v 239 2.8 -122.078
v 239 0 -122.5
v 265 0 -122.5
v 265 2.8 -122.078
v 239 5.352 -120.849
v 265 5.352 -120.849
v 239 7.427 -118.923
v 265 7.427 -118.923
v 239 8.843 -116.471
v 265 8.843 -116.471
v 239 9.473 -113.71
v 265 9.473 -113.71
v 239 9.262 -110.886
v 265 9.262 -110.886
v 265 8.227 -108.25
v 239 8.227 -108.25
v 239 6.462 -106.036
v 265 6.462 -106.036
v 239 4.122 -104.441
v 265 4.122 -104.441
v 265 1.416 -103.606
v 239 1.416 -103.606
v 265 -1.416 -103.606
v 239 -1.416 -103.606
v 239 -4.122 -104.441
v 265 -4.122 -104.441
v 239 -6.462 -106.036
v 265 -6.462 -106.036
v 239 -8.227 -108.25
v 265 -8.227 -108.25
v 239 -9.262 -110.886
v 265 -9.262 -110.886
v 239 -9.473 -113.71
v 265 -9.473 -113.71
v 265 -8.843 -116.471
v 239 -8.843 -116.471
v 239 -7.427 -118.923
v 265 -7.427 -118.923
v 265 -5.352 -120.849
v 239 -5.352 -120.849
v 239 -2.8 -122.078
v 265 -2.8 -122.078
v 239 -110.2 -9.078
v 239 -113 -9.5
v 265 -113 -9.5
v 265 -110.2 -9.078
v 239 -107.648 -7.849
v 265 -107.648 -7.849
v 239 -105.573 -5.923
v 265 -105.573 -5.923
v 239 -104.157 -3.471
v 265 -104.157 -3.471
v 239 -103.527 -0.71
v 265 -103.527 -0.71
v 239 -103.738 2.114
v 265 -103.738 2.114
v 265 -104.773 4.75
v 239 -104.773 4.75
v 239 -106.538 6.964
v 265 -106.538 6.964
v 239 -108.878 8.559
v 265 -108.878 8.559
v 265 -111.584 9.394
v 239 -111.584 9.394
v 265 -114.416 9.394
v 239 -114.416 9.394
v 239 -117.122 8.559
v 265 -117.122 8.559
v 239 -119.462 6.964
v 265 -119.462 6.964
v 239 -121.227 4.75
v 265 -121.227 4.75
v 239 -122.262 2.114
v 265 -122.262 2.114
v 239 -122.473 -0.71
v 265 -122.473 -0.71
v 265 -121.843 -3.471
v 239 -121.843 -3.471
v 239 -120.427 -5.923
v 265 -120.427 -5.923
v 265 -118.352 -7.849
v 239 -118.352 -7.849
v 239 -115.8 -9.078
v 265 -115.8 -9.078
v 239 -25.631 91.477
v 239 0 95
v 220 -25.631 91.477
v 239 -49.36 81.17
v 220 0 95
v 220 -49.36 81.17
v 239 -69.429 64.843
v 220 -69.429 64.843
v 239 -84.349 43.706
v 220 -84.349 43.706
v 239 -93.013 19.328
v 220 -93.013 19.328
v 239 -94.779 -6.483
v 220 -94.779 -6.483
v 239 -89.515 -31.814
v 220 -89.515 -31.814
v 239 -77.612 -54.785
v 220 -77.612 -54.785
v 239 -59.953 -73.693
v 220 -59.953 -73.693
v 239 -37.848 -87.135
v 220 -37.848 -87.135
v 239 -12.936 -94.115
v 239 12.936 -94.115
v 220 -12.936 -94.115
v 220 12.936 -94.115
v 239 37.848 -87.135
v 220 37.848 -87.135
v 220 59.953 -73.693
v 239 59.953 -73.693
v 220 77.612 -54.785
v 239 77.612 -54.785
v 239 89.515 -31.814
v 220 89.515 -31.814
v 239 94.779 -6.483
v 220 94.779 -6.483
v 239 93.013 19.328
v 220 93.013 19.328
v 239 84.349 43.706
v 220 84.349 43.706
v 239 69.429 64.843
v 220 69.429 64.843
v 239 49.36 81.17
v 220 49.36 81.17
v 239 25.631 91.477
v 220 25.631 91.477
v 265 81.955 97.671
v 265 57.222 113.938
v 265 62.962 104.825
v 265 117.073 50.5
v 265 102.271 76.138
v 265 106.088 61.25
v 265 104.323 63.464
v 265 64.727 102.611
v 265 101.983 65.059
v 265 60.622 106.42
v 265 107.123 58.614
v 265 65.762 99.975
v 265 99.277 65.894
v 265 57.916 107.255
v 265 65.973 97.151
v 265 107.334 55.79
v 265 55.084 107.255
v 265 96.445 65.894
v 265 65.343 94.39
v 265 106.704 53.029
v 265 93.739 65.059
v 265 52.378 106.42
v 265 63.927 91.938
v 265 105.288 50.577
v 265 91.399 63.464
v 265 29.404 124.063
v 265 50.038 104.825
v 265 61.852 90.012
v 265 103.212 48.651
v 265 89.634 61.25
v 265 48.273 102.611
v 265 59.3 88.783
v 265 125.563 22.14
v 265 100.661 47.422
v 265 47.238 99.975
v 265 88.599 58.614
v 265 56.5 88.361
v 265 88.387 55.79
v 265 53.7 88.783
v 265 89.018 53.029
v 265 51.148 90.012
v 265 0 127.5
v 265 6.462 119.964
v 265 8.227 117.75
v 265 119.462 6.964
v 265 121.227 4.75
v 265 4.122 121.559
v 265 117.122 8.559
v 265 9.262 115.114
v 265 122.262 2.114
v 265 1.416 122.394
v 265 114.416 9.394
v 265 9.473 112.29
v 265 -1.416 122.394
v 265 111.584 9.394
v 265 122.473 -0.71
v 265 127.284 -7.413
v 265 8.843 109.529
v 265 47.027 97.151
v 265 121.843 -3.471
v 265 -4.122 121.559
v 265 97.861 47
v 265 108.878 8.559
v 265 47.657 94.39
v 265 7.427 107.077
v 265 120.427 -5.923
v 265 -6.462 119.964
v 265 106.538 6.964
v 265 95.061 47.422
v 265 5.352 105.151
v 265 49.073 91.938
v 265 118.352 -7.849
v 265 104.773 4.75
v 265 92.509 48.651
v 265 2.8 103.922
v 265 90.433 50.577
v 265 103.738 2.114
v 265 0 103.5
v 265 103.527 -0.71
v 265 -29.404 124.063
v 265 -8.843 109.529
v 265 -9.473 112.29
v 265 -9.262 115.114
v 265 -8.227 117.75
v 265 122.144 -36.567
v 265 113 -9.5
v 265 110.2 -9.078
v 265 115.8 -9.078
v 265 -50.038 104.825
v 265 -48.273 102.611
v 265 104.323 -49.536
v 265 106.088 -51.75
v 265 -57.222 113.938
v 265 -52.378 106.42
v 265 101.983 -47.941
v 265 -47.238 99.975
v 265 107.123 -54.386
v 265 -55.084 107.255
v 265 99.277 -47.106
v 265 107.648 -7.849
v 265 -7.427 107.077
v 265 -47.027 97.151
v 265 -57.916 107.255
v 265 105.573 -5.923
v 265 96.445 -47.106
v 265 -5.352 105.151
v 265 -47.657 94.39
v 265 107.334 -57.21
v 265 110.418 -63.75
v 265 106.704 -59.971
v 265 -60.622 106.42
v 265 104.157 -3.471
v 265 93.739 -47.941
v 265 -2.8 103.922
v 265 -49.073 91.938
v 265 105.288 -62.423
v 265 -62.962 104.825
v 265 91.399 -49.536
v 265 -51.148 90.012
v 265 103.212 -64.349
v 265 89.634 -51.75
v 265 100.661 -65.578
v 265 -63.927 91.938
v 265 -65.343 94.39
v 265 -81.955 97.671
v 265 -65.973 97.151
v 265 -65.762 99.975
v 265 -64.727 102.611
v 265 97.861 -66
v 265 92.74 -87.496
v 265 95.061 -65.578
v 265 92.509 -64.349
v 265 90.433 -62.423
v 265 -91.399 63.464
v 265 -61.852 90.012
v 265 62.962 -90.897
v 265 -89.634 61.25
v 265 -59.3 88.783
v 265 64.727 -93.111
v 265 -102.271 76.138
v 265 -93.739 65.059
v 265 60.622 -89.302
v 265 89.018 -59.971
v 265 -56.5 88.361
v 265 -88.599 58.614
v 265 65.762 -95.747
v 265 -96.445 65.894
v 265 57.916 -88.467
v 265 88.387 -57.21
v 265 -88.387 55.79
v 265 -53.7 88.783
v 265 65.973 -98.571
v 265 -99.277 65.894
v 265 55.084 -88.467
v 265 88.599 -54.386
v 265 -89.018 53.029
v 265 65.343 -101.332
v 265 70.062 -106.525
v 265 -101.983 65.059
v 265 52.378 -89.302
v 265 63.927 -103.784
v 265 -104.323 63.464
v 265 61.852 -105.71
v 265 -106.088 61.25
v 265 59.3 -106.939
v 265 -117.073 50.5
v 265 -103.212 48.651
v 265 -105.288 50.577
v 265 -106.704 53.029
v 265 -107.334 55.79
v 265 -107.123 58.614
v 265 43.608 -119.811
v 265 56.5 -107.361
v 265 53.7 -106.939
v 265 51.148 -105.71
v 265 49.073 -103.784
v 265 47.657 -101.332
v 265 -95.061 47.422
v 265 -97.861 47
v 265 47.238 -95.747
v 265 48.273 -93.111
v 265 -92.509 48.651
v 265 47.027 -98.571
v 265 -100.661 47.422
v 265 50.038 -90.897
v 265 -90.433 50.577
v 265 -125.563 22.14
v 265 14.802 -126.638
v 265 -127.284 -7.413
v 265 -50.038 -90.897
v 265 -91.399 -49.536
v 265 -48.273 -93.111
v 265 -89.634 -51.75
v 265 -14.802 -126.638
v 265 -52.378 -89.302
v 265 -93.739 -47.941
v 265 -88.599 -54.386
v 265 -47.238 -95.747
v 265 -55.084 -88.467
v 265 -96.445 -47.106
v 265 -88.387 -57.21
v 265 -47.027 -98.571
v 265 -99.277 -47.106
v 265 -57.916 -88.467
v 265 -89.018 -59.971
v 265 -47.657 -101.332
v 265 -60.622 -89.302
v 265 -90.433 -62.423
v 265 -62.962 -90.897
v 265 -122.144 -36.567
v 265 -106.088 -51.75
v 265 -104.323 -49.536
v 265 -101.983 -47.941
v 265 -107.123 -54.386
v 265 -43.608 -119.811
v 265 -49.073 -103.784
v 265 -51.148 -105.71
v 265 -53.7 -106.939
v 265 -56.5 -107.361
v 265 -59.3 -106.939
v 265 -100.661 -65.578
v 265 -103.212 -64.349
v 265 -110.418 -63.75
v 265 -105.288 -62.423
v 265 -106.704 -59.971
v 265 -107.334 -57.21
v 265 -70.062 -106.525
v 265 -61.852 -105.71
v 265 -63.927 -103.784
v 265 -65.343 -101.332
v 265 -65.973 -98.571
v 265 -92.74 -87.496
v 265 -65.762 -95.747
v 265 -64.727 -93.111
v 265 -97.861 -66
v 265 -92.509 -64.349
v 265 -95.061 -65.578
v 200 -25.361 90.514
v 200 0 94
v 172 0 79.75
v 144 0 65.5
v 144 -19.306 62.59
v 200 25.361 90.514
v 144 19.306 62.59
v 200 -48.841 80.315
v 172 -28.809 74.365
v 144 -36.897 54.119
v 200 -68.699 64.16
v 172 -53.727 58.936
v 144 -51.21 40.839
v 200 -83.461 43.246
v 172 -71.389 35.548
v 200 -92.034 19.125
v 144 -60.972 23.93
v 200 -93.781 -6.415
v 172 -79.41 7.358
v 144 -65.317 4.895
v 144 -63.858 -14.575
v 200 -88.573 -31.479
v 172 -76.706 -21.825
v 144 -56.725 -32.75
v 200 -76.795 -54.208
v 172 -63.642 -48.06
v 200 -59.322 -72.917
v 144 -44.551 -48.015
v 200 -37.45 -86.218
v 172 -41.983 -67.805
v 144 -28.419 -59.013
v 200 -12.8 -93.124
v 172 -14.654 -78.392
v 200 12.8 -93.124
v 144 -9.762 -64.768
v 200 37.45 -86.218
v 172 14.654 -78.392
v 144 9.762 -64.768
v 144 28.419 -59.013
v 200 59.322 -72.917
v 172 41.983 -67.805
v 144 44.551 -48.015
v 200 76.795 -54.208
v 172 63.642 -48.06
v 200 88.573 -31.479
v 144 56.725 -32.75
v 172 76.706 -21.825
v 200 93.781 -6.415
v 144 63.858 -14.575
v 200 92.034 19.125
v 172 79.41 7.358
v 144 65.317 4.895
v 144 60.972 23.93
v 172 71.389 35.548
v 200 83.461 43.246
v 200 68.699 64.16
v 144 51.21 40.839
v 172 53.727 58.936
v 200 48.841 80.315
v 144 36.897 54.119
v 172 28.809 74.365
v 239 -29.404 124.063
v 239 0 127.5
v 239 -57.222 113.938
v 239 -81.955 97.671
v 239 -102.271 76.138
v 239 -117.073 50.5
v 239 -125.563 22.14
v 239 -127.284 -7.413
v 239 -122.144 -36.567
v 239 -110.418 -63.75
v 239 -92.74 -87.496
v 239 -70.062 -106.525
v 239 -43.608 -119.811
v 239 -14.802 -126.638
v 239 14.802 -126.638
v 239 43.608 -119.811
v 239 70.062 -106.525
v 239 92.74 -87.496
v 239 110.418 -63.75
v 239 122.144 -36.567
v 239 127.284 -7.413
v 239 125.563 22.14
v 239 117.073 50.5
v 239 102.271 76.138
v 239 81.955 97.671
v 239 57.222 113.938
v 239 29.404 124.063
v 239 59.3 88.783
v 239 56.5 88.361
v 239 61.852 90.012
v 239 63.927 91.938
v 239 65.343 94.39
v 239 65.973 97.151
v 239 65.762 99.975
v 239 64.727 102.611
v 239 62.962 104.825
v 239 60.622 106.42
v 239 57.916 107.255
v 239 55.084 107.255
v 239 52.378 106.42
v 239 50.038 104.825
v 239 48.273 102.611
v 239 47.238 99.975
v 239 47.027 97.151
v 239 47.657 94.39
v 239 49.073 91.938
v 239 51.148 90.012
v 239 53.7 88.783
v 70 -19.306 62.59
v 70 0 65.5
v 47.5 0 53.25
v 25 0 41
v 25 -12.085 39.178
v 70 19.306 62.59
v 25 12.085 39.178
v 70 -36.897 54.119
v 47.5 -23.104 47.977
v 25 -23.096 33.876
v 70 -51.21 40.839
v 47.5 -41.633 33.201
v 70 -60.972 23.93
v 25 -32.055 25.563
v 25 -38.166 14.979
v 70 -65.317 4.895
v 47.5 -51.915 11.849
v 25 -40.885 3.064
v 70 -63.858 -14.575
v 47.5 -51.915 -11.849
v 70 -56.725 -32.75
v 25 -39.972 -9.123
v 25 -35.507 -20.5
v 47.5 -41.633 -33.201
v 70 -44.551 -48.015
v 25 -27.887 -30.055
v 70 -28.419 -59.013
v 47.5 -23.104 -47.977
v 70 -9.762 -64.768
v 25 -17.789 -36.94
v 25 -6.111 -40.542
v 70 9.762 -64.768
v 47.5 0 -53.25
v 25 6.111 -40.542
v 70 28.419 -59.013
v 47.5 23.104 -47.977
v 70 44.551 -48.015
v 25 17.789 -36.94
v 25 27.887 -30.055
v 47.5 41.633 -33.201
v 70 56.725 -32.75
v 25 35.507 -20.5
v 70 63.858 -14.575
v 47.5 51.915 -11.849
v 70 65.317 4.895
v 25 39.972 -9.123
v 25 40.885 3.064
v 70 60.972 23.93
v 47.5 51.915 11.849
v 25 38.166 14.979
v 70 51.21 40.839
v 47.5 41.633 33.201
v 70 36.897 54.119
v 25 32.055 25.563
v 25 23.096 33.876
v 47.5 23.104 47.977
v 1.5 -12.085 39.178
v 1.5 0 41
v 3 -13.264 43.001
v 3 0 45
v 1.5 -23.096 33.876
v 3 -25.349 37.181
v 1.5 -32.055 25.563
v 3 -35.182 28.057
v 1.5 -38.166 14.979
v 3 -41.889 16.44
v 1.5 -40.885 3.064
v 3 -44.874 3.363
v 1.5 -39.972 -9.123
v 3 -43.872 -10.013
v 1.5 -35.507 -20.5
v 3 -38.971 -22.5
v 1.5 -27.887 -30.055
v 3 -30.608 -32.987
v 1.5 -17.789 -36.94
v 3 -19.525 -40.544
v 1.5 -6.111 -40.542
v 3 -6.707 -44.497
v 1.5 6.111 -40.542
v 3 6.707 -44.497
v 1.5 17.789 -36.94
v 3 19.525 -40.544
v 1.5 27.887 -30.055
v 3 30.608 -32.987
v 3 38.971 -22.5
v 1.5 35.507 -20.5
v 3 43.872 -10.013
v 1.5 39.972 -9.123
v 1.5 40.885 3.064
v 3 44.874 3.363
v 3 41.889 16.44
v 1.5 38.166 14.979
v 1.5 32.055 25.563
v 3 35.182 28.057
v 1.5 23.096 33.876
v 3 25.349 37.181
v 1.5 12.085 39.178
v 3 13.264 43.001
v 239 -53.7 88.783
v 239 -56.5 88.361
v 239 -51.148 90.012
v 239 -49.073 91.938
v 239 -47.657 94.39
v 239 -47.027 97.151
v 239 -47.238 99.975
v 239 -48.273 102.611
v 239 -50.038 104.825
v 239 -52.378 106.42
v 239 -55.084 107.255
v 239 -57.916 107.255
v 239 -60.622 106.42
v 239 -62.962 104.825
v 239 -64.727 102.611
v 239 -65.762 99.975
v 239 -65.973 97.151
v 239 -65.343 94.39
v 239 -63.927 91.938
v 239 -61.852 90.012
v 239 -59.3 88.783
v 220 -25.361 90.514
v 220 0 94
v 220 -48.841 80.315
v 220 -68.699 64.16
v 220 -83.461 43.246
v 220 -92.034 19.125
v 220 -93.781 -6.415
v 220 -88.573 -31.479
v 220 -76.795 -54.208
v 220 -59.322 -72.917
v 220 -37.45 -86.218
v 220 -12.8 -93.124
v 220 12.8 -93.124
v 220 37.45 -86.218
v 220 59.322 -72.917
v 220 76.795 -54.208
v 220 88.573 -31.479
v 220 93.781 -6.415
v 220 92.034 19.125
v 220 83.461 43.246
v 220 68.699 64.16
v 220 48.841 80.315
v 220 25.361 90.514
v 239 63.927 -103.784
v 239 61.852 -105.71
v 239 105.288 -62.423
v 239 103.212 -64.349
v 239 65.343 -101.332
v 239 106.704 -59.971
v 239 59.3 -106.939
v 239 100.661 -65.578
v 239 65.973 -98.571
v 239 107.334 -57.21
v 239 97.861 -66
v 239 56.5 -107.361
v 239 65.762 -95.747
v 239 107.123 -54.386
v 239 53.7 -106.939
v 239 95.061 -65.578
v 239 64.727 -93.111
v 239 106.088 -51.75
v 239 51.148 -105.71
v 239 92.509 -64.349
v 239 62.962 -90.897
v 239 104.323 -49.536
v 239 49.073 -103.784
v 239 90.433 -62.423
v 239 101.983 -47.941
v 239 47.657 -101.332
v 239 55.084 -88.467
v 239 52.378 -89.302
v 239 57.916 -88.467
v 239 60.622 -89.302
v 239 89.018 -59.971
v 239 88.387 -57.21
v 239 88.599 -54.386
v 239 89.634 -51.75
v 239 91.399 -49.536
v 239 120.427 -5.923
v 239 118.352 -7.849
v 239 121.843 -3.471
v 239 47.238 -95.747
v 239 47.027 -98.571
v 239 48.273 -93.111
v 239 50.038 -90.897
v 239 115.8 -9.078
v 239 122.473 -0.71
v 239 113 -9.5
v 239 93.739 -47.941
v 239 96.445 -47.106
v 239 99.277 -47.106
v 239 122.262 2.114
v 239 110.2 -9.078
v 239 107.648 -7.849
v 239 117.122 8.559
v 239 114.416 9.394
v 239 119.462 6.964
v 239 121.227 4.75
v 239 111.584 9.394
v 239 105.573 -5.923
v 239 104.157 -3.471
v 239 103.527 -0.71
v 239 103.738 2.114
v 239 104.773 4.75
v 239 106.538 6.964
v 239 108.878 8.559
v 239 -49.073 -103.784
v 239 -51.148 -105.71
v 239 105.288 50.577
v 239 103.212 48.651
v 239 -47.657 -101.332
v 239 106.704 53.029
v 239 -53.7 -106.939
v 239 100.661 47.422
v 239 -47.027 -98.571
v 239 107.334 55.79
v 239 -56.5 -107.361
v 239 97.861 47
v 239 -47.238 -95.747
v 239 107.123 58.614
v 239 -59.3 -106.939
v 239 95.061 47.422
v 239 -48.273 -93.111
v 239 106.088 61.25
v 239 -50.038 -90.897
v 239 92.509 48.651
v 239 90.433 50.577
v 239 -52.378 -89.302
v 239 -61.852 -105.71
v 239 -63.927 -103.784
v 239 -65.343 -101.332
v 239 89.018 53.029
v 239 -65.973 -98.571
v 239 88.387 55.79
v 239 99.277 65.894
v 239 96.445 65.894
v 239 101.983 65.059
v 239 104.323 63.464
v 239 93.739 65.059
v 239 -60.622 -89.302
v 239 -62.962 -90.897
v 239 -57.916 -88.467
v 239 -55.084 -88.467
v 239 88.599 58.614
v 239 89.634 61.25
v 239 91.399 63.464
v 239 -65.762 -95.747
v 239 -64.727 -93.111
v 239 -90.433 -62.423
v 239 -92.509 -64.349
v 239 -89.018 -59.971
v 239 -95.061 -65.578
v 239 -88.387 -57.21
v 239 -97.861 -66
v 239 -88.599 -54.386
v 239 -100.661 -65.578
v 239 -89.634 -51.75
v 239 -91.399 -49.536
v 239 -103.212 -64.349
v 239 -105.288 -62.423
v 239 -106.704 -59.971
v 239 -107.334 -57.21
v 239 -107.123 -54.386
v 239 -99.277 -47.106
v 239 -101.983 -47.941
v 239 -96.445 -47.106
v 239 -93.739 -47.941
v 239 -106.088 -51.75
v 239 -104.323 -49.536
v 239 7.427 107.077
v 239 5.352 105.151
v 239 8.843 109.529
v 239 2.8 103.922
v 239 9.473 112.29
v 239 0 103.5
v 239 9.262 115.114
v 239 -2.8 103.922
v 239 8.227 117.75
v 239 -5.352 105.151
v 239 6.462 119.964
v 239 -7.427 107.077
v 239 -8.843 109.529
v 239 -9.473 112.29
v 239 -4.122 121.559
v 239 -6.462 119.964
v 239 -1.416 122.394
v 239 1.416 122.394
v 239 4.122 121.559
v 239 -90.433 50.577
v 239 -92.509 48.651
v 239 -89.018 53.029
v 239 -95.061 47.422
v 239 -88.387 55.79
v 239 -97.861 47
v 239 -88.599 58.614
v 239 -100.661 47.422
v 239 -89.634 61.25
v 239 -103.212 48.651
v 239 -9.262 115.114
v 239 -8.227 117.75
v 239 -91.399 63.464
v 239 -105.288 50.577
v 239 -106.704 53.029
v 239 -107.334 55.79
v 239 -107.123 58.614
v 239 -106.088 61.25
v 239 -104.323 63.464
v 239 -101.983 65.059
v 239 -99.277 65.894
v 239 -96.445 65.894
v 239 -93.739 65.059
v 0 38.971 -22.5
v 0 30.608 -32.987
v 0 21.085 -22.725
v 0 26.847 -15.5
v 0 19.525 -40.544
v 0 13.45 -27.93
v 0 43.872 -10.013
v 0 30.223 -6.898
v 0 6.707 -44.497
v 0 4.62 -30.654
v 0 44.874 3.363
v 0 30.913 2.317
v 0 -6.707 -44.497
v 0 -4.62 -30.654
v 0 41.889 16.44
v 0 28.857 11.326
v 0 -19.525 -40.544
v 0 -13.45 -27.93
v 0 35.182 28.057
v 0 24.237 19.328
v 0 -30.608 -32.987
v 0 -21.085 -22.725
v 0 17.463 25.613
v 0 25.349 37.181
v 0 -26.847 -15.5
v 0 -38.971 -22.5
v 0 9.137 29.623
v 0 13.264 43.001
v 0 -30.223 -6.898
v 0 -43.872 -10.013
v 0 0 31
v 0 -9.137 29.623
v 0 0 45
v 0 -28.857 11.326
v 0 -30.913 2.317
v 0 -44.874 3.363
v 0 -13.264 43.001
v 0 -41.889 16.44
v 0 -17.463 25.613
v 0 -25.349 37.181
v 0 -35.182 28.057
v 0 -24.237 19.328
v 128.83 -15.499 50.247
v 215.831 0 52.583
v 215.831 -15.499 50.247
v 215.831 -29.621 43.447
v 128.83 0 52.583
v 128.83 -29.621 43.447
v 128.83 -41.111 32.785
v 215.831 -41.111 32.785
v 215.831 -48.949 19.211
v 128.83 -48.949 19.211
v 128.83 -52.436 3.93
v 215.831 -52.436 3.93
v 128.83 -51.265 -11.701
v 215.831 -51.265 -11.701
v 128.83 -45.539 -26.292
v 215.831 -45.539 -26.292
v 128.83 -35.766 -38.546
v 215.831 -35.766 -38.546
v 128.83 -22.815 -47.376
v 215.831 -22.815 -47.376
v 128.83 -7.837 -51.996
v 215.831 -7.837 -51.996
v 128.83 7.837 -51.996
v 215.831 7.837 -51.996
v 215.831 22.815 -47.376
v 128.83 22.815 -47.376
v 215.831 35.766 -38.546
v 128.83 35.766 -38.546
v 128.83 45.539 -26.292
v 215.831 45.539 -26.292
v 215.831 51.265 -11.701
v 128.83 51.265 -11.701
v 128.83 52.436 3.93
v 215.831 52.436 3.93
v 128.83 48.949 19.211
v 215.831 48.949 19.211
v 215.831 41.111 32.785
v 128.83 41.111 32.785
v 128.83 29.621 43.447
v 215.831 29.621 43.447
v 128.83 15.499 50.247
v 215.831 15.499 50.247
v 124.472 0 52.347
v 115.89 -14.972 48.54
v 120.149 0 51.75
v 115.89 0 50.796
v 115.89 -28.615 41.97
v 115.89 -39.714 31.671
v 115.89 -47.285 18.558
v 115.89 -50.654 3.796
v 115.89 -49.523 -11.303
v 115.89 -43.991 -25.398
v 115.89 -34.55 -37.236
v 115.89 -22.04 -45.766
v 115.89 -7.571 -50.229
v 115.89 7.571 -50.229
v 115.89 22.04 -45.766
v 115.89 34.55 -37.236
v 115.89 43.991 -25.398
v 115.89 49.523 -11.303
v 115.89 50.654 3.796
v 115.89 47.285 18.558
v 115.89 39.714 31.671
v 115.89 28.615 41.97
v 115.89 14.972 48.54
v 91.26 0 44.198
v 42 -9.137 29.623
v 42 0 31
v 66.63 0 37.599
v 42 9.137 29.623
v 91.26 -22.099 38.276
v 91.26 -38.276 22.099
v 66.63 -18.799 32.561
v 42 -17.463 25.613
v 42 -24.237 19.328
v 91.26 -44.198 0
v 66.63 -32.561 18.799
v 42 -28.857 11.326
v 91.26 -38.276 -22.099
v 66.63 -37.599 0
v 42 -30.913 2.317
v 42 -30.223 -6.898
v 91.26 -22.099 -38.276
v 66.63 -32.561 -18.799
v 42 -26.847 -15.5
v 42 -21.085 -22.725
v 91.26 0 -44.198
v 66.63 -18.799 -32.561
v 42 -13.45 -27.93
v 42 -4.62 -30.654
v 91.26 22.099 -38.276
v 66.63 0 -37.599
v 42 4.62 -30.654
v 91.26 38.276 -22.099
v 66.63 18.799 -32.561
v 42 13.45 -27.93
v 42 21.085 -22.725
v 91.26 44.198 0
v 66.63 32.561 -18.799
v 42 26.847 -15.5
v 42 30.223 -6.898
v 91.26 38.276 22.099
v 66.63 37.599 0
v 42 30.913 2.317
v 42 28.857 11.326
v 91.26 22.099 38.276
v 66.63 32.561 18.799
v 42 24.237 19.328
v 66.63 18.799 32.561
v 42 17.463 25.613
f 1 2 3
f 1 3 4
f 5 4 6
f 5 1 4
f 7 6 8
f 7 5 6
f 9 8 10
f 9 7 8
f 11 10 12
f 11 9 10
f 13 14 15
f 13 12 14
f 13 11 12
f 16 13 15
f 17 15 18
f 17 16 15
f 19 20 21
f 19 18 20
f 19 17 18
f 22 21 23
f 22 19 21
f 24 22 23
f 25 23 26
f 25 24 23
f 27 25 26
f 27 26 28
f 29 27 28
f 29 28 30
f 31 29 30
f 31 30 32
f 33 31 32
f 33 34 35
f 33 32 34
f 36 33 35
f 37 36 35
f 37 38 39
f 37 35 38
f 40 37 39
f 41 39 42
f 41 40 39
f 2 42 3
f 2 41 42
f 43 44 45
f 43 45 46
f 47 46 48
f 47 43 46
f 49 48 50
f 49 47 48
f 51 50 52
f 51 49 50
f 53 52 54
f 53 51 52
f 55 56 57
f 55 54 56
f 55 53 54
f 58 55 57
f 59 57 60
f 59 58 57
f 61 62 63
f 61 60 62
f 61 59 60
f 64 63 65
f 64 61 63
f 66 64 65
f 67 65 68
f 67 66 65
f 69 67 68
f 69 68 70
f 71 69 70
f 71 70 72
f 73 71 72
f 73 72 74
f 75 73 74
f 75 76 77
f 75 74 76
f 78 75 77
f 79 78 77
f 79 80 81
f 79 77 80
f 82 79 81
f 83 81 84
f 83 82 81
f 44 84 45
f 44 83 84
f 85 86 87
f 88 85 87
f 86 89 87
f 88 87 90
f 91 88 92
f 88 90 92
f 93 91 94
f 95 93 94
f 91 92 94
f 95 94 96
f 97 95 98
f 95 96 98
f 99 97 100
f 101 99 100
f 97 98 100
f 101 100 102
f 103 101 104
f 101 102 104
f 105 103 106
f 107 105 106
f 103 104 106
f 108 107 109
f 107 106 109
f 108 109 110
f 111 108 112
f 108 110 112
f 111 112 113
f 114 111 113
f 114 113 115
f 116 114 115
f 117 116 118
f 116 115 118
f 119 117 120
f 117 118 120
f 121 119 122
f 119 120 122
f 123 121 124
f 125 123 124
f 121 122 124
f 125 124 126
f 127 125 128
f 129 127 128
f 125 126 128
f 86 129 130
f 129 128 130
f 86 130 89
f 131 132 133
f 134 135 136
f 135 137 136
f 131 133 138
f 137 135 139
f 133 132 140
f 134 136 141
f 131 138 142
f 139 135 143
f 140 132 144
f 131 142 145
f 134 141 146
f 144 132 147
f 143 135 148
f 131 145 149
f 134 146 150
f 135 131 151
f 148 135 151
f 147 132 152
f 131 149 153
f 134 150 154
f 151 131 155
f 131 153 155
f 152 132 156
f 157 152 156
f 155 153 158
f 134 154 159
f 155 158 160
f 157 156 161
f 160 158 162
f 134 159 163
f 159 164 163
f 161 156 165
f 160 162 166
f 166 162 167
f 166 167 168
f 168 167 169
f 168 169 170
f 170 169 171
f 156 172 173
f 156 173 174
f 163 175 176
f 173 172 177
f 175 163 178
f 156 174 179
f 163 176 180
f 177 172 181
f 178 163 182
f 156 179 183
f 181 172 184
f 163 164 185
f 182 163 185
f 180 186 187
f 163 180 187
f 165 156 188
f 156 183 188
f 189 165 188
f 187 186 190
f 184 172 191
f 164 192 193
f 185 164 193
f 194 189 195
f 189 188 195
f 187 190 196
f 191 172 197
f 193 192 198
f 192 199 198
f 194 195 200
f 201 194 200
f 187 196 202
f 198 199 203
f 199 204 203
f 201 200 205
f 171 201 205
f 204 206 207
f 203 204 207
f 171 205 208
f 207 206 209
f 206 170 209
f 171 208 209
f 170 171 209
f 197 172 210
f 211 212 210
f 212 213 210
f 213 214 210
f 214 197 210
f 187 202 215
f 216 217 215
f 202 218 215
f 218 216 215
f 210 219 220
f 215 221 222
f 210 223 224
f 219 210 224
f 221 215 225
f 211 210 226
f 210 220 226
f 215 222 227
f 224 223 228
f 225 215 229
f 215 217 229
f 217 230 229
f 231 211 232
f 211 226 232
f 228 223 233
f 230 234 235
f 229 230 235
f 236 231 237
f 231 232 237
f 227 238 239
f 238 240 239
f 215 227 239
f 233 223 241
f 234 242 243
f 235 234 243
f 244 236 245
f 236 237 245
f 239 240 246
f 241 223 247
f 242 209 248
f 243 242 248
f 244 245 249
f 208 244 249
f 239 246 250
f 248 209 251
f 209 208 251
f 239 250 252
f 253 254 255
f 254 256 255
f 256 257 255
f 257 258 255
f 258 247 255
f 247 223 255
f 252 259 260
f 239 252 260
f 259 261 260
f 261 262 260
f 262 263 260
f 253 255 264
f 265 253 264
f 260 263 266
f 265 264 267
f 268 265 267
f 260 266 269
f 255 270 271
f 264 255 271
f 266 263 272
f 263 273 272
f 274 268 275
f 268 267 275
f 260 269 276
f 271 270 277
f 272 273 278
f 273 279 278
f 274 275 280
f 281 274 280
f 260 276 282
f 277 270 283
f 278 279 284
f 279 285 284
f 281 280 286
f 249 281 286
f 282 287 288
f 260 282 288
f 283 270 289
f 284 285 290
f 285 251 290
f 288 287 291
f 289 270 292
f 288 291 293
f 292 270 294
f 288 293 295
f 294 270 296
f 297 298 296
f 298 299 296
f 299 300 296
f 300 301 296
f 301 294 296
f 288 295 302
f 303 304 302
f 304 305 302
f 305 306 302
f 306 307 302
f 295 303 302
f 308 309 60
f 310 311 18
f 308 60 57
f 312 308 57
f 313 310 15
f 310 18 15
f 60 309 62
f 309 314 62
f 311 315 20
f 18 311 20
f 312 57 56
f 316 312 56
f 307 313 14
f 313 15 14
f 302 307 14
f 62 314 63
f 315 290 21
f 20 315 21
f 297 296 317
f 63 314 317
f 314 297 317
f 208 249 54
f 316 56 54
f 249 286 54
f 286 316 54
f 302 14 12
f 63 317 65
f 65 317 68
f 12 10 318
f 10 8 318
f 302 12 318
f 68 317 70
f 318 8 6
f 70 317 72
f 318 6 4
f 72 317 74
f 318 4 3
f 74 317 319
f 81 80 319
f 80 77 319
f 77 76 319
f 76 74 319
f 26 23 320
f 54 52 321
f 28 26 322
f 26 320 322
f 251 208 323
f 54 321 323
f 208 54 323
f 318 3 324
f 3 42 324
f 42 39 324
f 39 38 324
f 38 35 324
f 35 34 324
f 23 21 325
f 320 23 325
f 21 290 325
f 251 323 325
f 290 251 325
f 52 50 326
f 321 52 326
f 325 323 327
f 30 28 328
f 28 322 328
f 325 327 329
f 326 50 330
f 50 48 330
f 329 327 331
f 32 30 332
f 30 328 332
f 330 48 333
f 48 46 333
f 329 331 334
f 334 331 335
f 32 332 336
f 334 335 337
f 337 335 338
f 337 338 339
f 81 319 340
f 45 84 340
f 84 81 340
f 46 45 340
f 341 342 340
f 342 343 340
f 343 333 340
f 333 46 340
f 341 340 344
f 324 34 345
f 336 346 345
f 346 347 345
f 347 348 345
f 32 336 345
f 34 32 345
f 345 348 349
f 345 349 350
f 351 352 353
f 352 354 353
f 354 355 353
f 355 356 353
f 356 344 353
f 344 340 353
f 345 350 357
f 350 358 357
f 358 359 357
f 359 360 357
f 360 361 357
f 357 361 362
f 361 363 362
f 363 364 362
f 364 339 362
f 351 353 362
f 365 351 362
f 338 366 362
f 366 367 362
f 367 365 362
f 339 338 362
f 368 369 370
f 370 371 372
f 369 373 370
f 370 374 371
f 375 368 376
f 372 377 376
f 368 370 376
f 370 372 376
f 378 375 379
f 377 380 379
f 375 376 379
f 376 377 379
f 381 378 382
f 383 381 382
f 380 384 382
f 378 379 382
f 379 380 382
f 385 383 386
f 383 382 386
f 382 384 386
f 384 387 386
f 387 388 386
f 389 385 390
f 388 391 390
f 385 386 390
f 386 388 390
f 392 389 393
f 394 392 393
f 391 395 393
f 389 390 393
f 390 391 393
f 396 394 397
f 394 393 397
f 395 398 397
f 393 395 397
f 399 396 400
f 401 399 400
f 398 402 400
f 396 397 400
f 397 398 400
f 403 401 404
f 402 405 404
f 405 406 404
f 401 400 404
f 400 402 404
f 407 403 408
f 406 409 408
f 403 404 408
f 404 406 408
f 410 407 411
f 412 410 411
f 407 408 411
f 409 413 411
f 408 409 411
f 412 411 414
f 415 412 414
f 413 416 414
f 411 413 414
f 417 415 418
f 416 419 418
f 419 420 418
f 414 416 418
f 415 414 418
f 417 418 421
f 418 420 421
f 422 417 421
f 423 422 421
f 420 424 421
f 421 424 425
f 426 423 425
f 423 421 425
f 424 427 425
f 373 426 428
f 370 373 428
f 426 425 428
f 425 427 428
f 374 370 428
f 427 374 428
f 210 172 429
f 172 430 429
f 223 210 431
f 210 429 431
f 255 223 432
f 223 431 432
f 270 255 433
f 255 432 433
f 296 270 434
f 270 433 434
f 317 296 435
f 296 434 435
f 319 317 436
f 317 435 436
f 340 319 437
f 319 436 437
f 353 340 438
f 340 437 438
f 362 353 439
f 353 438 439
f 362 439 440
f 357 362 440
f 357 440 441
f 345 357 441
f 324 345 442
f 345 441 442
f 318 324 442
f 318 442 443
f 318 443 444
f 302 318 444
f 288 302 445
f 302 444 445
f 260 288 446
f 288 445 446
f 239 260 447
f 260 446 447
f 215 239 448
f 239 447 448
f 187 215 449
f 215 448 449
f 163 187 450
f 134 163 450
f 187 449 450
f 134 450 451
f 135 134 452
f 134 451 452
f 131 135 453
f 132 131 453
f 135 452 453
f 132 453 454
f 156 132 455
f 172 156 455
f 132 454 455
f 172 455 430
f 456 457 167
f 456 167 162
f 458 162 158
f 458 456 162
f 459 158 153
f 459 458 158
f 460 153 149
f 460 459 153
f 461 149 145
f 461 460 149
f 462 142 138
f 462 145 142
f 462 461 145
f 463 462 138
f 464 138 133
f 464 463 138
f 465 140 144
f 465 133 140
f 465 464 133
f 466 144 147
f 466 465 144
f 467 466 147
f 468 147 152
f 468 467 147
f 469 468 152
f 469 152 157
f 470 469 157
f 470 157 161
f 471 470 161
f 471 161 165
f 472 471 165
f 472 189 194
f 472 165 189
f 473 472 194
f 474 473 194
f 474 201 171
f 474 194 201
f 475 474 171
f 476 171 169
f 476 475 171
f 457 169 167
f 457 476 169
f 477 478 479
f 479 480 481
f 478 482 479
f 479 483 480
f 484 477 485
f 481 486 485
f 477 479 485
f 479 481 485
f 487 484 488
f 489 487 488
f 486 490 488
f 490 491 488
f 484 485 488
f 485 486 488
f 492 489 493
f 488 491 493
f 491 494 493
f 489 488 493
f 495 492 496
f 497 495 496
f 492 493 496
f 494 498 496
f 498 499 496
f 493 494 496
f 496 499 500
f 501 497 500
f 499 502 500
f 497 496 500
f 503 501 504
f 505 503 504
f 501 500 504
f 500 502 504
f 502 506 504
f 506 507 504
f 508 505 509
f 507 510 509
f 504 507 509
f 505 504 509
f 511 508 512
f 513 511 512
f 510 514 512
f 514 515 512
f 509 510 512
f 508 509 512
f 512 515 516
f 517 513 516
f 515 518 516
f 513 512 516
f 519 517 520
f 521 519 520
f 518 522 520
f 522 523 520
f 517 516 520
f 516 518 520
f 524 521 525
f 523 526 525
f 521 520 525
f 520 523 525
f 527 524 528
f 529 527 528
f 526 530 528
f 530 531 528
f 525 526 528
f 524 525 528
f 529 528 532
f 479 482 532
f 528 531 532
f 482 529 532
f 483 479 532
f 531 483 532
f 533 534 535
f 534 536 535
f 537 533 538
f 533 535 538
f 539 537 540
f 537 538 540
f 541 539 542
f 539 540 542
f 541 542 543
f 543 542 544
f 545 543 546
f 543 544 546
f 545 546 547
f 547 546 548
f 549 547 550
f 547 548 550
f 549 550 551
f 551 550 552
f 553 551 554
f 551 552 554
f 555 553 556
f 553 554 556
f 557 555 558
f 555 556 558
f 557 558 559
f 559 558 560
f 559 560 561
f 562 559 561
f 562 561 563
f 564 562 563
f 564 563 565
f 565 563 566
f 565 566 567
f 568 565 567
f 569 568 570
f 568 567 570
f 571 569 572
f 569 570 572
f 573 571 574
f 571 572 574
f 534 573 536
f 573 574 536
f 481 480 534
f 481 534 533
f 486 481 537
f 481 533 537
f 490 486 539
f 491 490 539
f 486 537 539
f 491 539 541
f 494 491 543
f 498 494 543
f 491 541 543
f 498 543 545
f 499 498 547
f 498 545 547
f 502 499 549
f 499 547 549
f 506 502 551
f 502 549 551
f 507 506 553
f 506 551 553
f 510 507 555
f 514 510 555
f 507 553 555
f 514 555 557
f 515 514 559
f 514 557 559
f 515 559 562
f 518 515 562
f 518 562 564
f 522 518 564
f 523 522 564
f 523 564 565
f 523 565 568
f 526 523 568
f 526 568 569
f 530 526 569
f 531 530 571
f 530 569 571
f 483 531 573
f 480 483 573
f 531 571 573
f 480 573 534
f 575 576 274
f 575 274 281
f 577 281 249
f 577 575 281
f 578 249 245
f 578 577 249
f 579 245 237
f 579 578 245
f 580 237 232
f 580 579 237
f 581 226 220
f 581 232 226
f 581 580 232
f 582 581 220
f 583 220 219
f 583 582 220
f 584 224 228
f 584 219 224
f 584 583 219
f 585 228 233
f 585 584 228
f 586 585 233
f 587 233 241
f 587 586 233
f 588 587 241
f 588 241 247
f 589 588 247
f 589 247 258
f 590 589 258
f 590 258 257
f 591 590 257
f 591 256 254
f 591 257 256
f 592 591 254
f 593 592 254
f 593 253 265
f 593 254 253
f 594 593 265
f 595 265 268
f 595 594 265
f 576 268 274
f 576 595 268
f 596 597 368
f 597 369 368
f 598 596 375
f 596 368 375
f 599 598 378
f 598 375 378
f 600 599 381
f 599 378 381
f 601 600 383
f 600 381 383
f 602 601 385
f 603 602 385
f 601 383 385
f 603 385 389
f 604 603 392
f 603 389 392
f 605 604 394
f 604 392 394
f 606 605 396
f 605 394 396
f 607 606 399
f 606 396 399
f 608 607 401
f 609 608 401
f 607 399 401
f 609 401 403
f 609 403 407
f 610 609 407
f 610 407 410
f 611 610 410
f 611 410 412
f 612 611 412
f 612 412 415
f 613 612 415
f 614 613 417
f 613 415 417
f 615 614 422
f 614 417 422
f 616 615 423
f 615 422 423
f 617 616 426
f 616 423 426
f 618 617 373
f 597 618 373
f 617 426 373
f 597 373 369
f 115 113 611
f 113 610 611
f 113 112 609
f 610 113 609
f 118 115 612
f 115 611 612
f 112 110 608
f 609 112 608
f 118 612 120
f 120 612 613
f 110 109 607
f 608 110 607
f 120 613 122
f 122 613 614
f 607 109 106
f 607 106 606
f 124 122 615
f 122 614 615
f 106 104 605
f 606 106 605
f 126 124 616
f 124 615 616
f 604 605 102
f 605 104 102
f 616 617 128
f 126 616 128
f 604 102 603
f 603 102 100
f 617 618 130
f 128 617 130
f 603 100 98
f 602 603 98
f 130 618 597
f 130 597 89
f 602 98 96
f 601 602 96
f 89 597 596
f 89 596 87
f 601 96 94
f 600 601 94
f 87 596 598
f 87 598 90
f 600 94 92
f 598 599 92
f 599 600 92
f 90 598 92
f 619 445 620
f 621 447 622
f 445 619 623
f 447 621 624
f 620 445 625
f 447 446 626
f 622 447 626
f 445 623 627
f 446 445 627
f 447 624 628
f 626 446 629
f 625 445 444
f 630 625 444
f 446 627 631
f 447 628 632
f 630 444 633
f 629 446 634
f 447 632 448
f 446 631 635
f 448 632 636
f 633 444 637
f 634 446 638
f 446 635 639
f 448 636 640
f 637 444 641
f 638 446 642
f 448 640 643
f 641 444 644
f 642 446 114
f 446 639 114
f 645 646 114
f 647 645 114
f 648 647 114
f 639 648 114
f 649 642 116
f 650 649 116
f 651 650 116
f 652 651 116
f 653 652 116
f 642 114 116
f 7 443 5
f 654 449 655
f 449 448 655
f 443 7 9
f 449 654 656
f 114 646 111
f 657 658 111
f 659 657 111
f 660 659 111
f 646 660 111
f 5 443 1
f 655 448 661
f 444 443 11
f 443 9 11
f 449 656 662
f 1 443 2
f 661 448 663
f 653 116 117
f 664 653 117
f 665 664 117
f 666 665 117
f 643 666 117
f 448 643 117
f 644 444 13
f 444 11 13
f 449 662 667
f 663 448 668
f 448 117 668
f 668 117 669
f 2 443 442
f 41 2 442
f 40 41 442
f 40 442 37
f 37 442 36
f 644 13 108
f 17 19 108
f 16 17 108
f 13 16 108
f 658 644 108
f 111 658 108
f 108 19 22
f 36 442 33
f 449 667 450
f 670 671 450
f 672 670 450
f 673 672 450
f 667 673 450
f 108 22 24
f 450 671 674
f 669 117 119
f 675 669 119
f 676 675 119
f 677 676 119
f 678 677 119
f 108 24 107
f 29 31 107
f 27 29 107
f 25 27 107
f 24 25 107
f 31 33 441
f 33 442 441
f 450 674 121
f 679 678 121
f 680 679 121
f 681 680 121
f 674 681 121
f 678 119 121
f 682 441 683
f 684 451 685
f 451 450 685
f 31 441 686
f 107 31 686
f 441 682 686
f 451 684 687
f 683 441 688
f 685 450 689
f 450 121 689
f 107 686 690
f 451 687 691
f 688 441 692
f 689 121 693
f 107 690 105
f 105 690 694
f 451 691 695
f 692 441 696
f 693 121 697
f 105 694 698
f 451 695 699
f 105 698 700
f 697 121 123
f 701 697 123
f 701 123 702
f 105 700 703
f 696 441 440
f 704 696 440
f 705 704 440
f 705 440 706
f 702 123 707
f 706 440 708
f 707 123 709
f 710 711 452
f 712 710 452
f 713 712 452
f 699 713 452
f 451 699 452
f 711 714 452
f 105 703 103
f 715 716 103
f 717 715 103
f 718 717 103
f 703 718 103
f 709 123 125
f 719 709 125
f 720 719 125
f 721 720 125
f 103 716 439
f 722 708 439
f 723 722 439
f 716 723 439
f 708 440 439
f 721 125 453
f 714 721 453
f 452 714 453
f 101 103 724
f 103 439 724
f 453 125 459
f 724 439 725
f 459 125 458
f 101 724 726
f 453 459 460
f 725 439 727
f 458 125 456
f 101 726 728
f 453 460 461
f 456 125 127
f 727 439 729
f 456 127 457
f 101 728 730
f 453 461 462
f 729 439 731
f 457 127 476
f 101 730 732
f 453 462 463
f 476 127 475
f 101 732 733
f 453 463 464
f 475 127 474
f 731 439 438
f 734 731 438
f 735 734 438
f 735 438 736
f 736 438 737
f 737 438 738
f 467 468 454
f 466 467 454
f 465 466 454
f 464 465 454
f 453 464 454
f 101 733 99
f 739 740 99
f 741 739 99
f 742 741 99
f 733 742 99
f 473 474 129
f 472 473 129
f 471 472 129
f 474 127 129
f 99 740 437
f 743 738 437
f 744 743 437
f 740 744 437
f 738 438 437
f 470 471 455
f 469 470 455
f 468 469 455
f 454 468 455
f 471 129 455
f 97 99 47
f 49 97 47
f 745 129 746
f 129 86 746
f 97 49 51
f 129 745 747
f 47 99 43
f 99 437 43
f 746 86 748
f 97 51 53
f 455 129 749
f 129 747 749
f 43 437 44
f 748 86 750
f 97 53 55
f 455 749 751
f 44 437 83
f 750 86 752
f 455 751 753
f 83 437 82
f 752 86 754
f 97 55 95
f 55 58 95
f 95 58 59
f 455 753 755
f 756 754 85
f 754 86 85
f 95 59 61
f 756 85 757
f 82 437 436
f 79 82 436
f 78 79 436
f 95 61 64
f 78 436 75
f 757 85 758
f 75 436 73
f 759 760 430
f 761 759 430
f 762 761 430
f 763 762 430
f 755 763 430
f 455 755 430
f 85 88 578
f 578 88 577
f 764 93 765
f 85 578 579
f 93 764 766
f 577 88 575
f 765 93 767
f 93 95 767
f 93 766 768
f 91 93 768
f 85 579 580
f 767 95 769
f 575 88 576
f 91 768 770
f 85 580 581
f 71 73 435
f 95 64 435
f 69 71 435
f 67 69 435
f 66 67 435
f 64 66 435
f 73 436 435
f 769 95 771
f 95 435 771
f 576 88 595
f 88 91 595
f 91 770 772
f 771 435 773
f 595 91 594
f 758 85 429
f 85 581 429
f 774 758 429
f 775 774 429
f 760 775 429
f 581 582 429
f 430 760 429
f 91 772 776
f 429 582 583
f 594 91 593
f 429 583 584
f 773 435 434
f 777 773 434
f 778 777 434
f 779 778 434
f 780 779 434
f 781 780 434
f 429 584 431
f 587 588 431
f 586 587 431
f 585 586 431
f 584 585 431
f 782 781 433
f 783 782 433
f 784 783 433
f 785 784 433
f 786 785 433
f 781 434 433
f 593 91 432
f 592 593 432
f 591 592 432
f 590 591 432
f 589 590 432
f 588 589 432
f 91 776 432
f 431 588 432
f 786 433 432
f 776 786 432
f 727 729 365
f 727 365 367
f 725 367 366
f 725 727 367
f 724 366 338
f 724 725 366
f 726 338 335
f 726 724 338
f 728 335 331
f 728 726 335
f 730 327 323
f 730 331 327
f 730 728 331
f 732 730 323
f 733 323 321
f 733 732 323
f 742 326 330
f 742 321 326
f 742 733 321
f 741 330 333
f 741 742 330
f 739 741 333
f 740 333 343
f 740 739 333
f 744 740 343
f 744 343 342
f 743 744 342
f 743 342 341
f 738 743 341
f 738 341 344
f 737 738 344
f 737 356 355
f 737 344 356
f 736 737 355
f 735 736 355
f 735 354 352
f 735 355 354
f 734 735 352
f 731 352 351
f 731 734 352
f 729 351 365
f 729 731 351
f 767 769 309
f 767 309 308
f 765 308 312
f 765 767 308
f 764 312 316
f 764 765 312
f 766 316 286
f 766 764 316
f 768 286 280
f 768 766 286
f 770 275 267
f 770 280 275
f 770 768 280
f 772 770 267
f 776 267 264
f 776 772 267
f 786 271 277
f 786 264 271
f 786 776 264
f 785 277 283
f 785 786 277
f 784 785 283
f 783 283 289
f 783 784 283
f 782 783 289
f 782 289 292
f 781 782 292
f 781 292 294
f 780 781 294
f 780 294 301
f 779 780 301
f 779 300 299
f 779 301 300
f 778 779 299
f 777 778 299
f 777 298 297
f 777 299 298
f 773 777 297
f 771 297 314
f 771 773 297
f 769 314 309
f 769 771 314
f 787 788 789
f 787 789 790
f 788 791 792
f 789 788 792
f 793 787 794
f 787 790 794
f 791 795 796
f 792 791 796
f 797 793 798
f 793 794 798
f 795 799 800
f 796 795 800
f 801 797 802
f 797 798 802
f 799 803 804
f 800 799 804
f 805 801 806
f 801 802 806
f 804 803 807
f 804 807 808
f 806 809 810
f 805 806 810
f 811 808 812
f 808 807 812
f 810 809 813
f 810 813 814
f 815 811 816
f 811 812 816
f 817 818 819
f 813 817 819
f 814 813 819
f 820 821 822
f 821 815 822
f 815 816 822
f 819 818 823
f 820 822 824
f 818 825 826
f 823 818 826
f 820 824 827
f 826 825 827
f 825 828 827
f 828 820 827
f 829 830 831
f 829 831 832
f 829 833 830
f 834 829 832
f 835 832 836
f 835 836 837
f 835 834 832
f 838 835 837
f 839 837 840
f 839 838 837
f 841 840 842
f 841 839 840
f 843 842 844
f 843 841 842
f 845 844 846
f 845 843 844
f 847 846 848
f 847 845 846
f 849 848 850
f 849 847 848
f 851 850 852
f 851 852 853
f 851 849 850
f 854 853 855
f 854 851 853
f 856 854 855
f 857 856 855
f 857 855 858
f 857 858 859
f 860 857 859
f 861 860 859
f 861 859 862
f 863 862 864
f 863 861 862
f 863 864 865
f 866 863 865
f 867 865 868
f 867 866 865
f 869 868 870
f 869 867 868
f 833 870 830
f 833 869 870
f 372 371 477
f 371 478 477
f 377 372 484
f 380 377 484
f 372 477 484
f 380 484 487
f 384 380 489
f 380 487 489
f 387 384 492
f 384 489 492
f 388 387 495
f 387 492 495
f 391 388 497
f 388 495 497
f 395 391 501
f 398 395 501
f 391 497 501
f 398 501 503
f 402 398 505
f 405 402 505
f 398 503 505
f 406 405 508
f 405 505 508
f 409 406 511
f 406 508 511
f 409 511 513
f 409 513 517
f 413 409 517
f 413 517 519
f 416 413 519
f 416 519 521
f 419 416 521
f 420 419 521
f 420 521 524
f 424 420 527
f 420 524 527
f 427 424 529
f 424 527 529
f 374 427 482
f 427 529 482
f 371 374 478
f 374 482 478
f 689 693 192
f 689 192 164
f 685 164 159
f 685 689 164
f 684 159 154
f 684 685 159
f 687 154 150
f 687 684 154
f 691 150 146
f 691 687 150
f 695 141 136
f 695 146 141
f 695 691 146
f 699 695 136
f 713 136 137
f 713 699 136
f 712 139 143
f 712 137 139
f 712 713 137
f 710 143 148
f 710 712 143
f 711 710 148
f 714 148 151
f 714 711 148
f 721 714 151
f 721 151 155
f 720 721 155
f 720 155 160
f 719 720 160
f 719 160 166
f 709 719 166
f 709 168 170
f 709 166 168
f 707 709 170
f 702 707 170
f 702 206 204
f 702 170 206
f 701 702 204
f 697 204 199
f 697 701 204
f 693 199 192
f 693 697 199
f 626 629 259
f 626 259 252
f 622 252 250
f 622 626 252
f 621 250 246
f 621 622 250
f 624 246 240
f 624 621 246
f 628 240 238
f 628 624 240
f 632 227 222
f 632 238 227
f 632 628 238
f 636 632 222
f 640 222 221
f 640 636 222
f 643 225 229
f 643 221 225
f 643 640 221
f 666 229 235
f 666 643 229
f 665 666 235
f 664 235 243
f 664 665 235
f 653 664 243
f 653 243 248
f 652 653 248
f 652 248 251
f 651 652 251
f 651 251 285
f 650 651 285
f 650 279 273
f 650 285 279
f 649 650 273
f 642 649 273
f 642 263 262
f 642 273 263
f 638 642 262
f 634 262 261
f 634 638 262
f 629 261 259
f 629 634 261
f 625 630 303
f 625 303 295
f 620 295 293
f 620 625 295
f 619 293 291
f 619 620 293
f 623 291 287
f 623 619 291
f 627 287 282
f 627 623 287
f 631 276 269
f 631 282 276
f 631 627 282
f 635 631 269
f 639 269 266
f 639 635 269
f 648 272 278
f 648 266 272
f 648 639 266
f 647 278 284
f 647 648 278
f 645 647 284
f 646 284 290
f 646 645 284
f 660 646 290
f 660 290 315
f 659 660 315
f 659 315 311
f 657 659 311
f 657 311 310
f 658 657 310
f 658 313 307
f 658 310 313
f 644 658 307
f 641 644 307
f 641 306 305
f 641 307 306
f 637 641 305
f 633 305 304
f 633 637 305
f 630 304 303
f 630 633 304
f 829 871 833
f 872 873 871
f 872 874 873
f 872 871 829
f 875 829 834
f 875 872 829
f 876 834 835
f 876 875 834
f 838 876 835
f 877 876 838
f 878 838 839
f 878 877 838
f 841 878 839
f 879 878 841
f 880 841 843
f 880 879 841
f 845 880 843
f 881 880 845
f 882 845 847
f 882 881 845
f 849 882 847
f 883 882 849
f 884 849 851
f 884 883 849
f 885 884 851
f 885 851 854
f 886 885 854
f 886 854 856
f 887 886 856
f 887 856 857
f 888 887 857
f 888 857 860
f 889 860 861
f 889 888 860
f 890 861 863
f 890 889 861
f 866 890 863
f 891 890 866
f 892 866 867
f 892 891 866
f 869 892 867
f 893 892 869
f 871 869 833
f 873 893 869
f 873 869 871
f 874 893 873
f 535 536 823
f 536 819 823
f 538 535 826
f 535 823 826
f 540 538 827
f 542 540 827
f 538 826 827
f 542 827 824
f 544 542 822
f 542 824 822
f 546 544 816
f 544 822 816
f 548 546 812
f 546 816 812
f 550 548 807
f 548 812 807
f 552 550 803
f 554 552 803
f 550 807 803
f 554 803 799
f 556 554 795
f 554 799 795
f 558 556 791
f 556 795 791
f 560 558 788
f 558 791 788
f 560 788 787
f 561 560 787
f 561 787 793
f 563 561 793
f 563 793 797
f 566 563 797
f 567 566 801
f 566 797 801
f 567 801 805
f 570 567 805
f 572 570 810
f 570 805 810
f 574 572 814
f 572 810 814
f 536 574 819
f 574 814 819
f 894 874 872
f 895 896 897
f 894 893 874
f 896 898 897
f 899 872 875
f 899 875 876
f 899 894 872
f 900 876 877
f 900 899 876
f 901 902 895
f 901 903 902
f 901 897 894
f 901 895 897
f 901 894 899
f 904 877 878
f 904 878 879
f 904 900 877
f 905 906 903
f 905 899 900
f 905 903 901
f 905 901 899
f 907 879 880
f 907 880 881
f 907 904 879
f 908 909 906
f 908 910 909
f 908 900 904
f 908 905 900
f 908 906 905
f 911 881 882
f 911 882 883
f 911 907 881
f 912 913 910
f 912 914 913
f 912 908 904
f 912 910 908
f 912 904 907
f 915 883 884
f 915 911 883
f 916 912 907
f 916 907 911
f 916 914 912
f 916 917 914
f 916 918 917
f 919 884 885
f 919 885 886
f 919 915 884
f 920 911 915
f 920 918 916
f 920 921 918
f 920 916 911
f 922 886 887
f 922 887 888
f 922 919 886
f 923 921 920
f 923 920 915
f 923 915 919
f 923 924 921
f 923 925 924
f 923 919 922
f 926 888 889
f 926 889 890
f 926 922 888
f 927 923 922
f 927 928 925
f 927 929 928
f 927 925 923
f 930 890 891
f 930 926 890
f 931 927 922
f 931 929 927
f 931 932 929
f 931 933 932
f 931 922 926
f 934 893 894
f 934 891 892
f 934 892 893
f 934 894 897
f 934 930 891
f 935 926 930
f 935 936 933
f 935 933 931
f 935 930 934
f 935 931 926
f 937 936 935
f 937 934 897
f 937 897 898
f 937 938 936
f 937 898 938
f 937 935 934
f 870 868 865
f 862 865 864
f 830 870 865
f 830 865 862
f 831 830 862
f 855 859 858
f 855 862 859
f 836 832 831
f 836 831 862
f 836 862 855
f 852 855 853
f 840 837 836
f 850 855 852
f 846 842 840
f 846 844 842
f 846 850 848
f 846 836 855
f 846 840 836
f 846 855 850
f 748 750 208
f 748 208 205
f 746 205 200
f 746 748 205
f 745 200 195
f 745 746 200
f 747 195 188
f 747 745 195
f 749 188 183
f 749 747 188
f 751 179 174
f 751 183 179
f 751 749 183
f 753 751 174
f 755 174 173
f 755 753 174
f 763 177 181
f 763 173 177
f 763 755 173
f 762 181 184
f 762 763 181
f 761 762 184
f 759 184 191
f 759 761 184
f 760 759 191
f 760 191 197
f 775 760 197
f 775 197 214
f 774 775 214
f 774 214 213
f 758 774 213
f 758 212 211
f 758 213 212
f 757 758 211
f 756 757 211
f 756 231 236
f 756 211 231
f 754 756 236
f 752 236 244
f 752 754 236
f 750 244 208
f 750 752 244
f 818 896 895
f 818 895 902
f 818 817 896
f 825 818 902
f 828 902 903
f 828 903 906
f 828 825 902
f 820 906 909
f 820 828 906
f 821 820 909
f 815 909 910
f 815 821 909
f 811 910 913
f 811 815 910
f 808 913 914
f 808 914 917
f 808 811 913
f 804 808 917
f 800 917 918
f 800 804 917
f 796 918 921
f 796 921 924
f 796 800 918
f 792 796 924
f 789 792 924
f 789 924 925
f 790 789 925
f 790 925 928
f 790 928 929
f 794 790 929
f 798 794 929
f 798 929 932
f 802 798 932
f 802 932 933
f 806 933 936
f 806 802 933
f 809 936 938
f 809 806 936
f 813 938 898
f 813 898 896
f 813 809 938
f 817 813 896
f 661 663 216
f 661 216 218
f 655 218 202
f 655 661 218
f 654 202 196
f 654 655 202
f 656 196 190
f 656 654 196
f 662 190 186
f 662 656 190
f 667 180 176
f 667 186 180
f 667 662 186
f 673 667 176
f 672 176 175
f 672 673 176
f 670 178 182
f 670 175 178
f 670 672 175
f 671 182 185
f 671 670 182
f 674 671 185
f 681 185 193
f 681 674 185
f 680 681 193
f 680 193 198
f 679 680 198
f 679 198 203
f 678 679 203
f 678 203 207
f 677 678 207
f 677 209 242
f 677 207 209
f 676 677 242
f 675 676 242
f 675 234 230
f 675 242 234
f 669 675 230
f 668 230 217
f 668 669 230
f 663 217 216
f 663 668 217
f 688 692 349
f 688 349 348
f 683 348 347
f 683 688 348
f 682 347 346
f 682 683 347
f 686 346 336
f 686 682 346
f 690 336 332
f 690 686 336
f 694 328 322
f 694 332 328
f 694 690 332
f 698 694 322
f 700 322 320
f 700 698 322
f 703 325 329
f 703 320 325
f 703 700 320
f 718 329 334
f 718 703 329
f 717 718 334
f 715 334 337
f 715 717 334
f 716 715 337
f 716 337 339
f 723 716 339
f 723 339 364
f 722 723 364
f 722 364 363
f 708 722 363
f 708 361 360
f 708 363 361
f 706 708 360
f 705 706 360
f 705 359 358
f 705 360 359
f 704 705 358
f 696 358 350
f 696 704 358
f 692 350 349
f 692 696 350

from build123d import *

# Parameters (mm, degrees)
SKETCH_3_R           = 9.5
CUT_EXTRUDE_1_DEPTH  = 321.526909947
SKETCH_4_R           = 9.5
CUT_EXTRUDE_2_DEPTH  = 321.526909947
SKETCH_5_R           = 9.5
CUT_EXTRUDE_3_DEPTH  = 321.526909947
SKETCH_6_R           = 9.5
CUT_EXTRUDE_4_DEPTH  = 321.526909947
SKETCH_7_R           = 9.5
CUT_EXTRUDE_5_DEPTH  = 321.526909947
SKETCH_8_R           = 9.5
CUT_EXTRUDE_6_DEPTH  = 321.526909947
SKETCH_9_R           = 9.5
CUT_EXTRUDE_7_DEPTH  = 321.526909947
SKETCH_10_R          = 9.5
CUT_EXTRUDE_8_DEPTH  = 321.526909947
SKETCH_11_R          = 9.5
CUT_EXTRUDE_9_DEPTH  = 321.526909947
SKETCH_12_R          = 9.5
CUT_EXTRUDE_10_DEPTH = 321.526909947
SKETCH_13_R          = 9.5
CUT_EXTRUDE_11_DEPTH = 321.526909947
SKETCH_14_R          = 9.5
CUT_EXTRUDE_12_DEPTH = 321.526909947


with BuildPart() as part:
    # Эскиз1 → Повернуть1 (revolve)
    with BuildSketch(Plane.XY, mode=Mode.PRIVATE) as revolve_1_sk:
        Polygon((0, 0), (265, 0), (265, 127.5), (239, 127.5), (239, 100), (239, 95), (220, 95), (220, 94), (200, 94), (144, 65.5), (70, 65.5), (25, 41), (1.5, 41), (3, 45), (0, 45), align=None)
    revolve(revolve_1_sk.sketch.rotate(Axis((0, 0, 0), (1, 0, 0)), 90), axis=Axis((0, 0, 0), (1, 0, 0)))

    # Эскиз2 → Вырез-Повернуть1 (revolve, cut)
    with BuildSketch(Plane.XY, mode=Mode.PRIVATE) as cut_revolve_1_sk:
        with BuildLine():
            Line((0, 0), (215.831336185, 0))
            Line((215.831336185, 0), (215.831336185, 52.583474267))
            Line((215.831336185, 52.583474267), (133.831336185, 52.583474267))
            Line((133.831336185, 52.583474267), (128.830273914, 52.583474267))
            ThreePointArc((128.830273914, 52.583474267), (122.304621517, 52.09322577), (115.89038393, 50.796291315))
            Line((115.89038393, 50.796291315), (42, 31))
            Line((42, 31), (0, 31))
            Line((0, 31), (0, 0))
        make_face()
    revolve(cut_revolve_1_sk.sketch.rotate(Axis((0, 0, 0), (1, 0, 0)), 90), axis=Axis((0, 0, 0), (1, 0, 0)), mode=Mode.SUBTRACT)

    # Эскиз3 → Вырез-Вытянуть1 (cut, through all)
    with BuildSketch(Plane(origin=(0, 0, 0), x_dir=(0, 0, -1), z_dir=(1, 0, 0))):
        with Locations((0, 113)):
            Circle(SKETCH_3_R)
    extrude(amount=CUT_EXTRUDE_1_DEPTH, mode=Mode.SUBTRACT)

    # Эскиз4 → Вырез-Вытянуть2 (cut, through all)
    with BuildSketch(Plane(origin=(0, 0, 0), x_dir=(0, 0, -1), z_dir=(1, 0, 0))):
        with Locations((-56.5, 97.860870628)):
            Circle(SKETCH_4_R)
    extrude(amount=CUT_EXTRUDE_2_DEPTH, mode=Mode.SUBTRACT)

    # Эскиз5 → Вырез-Вытянуть3 (cut, through all)
    with BuildSketch(Plane(origin=(0, 0, 0), x_dir=(0, 0, -1), z_dir=(1, 0, 0))):
        with Locations((-97.860870628, 56.5)):
            Circle(SKETCH_5_R)
    extrude(amount=CUT_EXTRUDE_3_DEPTH, mode=Mode.SUBTRACT)

    # Эскиз6 → Вырез-Вытянуть4 (cut, through all)
    with BuildSketch(Plane(origin=(0, 0, 0), x_dir=(0, 0, -1), z_dir=(1, 0, 0))):
        with Locations((-113, 0)):
            Circle(SKETCH_6_R)
    extrude(amount=CUT_EXTRUDE_4_DEPTH, mode=Mode.SUBTRACT)

    # Эскиз7 → Вырез-Вытянуть5 (cut, through all)
    with BuildSketch(Plane(origin=(0, 0, 0), x_dir=(0, 0, -1), z_dir=(1, 0, 0))):
        with Locations((-97.860870628, -56.5)):
            Circle(SKETCH_7_R)
    extrude(amount=CUT_EXTRUDE_5_DEPTH, mode=Mode.SUBTRACT)

    # Эскиз8 → Вырез-Вытянуть6 (cut, through all)
    with BuildSketch(Plane(origin=(0, 0, 0), x_dir=(0, 0, -1), z_dir=(1, 0, 0))):
        with Locations((-56.5, -97.860870628)):
            Circle(SKETCH_8_R)
    extrude(amount=CUT_EXTRUDE_6_DEPTH, mode=Mode.SUBTRACT)

    # Эскиз9 → Вырез-Вытянуть7 (cut, through all)
    with BuildSketch(Plane(origin=(0, 0, 0), x_dir=(0, 0, -1), z_dir=(1, 0, 0))):
        with Locations((0, -113)):
            Circle(SKETCH_9_R)
    extrude(amount=CUT_EXTRUDE_7_DEPTH, mode=Mode.SUBTRACT)

    # Эскиз10 → Вырез-Вытянуть8 (cut, through all)
    with BuildSketch(Plane(origin=(0, 0, 0), x_dir=(0, 0, -1), z_dir=(1, 0, 0))):
        with Locations((56.5, -97.860870628)):
            Circle(SKETCH_10_R)
    extrude(amount=CUT_EXTRUDE_8_DEPTH, mode=Mode.SUBTRACT)

    # Эскиз11 → Вырез-Вытянуть9 (cut, through all)
    with BuildSketch(Plane(origin=(0, 0, 0), x_dir=(0, 0, -1), z_dir=(1, 0, 0))):
        with Locations((97.860870628, -56.5)):
            Circle(SKETCH_11_R)
    extrude(amount=CUT_EXTRUDE_9_DEPTH, mode=Mode.SUBTRACT)

    # Эскиз12 → Вырез-Вытянуть10 (cut, through all)
    with BuildSketch(Plane(origin=(0, 0, 0), x_dir=(0, 0, -1), z_dir=(1, 0, 0))):
        with Locations((113, 0)):
            Circle(SKETCH_12_R)
    extrude(amount=CUT_EXTRUDE_10_DEPTH, mode=Mode.SUBTRACT)

    # Эскиз13 → Вырез-Вытянуть11 (cut, through all)
    with BuildSketch(Plane(origin=(0, 0, 0), x_dir=(0, 0, -1), z_dir=(1, 0, 0))):
        with Locations((97.860870628, 56.5)):
            Circle(SKETCH_13_R)
    extrude(amount=CUT_EXTRUDE_11_DEPTH, mode=Mode.SUBTRACT)

    # Эскиз14 → Вырез-Вытянуть12 (cut, through all)
    with BuildSketch(Plane(origin=(0, 0, 0), x_dir=(0, 0, -1), z_dir=(1, 0, 0))):
        with Locations((56.5, 97.860870628)):
            Circle(SKETCH_14_R)
    extrude(amount=CUT_EXTRUDE_12_DEPTH, mode=Mode.SUBTRACT)


solid = part.part
